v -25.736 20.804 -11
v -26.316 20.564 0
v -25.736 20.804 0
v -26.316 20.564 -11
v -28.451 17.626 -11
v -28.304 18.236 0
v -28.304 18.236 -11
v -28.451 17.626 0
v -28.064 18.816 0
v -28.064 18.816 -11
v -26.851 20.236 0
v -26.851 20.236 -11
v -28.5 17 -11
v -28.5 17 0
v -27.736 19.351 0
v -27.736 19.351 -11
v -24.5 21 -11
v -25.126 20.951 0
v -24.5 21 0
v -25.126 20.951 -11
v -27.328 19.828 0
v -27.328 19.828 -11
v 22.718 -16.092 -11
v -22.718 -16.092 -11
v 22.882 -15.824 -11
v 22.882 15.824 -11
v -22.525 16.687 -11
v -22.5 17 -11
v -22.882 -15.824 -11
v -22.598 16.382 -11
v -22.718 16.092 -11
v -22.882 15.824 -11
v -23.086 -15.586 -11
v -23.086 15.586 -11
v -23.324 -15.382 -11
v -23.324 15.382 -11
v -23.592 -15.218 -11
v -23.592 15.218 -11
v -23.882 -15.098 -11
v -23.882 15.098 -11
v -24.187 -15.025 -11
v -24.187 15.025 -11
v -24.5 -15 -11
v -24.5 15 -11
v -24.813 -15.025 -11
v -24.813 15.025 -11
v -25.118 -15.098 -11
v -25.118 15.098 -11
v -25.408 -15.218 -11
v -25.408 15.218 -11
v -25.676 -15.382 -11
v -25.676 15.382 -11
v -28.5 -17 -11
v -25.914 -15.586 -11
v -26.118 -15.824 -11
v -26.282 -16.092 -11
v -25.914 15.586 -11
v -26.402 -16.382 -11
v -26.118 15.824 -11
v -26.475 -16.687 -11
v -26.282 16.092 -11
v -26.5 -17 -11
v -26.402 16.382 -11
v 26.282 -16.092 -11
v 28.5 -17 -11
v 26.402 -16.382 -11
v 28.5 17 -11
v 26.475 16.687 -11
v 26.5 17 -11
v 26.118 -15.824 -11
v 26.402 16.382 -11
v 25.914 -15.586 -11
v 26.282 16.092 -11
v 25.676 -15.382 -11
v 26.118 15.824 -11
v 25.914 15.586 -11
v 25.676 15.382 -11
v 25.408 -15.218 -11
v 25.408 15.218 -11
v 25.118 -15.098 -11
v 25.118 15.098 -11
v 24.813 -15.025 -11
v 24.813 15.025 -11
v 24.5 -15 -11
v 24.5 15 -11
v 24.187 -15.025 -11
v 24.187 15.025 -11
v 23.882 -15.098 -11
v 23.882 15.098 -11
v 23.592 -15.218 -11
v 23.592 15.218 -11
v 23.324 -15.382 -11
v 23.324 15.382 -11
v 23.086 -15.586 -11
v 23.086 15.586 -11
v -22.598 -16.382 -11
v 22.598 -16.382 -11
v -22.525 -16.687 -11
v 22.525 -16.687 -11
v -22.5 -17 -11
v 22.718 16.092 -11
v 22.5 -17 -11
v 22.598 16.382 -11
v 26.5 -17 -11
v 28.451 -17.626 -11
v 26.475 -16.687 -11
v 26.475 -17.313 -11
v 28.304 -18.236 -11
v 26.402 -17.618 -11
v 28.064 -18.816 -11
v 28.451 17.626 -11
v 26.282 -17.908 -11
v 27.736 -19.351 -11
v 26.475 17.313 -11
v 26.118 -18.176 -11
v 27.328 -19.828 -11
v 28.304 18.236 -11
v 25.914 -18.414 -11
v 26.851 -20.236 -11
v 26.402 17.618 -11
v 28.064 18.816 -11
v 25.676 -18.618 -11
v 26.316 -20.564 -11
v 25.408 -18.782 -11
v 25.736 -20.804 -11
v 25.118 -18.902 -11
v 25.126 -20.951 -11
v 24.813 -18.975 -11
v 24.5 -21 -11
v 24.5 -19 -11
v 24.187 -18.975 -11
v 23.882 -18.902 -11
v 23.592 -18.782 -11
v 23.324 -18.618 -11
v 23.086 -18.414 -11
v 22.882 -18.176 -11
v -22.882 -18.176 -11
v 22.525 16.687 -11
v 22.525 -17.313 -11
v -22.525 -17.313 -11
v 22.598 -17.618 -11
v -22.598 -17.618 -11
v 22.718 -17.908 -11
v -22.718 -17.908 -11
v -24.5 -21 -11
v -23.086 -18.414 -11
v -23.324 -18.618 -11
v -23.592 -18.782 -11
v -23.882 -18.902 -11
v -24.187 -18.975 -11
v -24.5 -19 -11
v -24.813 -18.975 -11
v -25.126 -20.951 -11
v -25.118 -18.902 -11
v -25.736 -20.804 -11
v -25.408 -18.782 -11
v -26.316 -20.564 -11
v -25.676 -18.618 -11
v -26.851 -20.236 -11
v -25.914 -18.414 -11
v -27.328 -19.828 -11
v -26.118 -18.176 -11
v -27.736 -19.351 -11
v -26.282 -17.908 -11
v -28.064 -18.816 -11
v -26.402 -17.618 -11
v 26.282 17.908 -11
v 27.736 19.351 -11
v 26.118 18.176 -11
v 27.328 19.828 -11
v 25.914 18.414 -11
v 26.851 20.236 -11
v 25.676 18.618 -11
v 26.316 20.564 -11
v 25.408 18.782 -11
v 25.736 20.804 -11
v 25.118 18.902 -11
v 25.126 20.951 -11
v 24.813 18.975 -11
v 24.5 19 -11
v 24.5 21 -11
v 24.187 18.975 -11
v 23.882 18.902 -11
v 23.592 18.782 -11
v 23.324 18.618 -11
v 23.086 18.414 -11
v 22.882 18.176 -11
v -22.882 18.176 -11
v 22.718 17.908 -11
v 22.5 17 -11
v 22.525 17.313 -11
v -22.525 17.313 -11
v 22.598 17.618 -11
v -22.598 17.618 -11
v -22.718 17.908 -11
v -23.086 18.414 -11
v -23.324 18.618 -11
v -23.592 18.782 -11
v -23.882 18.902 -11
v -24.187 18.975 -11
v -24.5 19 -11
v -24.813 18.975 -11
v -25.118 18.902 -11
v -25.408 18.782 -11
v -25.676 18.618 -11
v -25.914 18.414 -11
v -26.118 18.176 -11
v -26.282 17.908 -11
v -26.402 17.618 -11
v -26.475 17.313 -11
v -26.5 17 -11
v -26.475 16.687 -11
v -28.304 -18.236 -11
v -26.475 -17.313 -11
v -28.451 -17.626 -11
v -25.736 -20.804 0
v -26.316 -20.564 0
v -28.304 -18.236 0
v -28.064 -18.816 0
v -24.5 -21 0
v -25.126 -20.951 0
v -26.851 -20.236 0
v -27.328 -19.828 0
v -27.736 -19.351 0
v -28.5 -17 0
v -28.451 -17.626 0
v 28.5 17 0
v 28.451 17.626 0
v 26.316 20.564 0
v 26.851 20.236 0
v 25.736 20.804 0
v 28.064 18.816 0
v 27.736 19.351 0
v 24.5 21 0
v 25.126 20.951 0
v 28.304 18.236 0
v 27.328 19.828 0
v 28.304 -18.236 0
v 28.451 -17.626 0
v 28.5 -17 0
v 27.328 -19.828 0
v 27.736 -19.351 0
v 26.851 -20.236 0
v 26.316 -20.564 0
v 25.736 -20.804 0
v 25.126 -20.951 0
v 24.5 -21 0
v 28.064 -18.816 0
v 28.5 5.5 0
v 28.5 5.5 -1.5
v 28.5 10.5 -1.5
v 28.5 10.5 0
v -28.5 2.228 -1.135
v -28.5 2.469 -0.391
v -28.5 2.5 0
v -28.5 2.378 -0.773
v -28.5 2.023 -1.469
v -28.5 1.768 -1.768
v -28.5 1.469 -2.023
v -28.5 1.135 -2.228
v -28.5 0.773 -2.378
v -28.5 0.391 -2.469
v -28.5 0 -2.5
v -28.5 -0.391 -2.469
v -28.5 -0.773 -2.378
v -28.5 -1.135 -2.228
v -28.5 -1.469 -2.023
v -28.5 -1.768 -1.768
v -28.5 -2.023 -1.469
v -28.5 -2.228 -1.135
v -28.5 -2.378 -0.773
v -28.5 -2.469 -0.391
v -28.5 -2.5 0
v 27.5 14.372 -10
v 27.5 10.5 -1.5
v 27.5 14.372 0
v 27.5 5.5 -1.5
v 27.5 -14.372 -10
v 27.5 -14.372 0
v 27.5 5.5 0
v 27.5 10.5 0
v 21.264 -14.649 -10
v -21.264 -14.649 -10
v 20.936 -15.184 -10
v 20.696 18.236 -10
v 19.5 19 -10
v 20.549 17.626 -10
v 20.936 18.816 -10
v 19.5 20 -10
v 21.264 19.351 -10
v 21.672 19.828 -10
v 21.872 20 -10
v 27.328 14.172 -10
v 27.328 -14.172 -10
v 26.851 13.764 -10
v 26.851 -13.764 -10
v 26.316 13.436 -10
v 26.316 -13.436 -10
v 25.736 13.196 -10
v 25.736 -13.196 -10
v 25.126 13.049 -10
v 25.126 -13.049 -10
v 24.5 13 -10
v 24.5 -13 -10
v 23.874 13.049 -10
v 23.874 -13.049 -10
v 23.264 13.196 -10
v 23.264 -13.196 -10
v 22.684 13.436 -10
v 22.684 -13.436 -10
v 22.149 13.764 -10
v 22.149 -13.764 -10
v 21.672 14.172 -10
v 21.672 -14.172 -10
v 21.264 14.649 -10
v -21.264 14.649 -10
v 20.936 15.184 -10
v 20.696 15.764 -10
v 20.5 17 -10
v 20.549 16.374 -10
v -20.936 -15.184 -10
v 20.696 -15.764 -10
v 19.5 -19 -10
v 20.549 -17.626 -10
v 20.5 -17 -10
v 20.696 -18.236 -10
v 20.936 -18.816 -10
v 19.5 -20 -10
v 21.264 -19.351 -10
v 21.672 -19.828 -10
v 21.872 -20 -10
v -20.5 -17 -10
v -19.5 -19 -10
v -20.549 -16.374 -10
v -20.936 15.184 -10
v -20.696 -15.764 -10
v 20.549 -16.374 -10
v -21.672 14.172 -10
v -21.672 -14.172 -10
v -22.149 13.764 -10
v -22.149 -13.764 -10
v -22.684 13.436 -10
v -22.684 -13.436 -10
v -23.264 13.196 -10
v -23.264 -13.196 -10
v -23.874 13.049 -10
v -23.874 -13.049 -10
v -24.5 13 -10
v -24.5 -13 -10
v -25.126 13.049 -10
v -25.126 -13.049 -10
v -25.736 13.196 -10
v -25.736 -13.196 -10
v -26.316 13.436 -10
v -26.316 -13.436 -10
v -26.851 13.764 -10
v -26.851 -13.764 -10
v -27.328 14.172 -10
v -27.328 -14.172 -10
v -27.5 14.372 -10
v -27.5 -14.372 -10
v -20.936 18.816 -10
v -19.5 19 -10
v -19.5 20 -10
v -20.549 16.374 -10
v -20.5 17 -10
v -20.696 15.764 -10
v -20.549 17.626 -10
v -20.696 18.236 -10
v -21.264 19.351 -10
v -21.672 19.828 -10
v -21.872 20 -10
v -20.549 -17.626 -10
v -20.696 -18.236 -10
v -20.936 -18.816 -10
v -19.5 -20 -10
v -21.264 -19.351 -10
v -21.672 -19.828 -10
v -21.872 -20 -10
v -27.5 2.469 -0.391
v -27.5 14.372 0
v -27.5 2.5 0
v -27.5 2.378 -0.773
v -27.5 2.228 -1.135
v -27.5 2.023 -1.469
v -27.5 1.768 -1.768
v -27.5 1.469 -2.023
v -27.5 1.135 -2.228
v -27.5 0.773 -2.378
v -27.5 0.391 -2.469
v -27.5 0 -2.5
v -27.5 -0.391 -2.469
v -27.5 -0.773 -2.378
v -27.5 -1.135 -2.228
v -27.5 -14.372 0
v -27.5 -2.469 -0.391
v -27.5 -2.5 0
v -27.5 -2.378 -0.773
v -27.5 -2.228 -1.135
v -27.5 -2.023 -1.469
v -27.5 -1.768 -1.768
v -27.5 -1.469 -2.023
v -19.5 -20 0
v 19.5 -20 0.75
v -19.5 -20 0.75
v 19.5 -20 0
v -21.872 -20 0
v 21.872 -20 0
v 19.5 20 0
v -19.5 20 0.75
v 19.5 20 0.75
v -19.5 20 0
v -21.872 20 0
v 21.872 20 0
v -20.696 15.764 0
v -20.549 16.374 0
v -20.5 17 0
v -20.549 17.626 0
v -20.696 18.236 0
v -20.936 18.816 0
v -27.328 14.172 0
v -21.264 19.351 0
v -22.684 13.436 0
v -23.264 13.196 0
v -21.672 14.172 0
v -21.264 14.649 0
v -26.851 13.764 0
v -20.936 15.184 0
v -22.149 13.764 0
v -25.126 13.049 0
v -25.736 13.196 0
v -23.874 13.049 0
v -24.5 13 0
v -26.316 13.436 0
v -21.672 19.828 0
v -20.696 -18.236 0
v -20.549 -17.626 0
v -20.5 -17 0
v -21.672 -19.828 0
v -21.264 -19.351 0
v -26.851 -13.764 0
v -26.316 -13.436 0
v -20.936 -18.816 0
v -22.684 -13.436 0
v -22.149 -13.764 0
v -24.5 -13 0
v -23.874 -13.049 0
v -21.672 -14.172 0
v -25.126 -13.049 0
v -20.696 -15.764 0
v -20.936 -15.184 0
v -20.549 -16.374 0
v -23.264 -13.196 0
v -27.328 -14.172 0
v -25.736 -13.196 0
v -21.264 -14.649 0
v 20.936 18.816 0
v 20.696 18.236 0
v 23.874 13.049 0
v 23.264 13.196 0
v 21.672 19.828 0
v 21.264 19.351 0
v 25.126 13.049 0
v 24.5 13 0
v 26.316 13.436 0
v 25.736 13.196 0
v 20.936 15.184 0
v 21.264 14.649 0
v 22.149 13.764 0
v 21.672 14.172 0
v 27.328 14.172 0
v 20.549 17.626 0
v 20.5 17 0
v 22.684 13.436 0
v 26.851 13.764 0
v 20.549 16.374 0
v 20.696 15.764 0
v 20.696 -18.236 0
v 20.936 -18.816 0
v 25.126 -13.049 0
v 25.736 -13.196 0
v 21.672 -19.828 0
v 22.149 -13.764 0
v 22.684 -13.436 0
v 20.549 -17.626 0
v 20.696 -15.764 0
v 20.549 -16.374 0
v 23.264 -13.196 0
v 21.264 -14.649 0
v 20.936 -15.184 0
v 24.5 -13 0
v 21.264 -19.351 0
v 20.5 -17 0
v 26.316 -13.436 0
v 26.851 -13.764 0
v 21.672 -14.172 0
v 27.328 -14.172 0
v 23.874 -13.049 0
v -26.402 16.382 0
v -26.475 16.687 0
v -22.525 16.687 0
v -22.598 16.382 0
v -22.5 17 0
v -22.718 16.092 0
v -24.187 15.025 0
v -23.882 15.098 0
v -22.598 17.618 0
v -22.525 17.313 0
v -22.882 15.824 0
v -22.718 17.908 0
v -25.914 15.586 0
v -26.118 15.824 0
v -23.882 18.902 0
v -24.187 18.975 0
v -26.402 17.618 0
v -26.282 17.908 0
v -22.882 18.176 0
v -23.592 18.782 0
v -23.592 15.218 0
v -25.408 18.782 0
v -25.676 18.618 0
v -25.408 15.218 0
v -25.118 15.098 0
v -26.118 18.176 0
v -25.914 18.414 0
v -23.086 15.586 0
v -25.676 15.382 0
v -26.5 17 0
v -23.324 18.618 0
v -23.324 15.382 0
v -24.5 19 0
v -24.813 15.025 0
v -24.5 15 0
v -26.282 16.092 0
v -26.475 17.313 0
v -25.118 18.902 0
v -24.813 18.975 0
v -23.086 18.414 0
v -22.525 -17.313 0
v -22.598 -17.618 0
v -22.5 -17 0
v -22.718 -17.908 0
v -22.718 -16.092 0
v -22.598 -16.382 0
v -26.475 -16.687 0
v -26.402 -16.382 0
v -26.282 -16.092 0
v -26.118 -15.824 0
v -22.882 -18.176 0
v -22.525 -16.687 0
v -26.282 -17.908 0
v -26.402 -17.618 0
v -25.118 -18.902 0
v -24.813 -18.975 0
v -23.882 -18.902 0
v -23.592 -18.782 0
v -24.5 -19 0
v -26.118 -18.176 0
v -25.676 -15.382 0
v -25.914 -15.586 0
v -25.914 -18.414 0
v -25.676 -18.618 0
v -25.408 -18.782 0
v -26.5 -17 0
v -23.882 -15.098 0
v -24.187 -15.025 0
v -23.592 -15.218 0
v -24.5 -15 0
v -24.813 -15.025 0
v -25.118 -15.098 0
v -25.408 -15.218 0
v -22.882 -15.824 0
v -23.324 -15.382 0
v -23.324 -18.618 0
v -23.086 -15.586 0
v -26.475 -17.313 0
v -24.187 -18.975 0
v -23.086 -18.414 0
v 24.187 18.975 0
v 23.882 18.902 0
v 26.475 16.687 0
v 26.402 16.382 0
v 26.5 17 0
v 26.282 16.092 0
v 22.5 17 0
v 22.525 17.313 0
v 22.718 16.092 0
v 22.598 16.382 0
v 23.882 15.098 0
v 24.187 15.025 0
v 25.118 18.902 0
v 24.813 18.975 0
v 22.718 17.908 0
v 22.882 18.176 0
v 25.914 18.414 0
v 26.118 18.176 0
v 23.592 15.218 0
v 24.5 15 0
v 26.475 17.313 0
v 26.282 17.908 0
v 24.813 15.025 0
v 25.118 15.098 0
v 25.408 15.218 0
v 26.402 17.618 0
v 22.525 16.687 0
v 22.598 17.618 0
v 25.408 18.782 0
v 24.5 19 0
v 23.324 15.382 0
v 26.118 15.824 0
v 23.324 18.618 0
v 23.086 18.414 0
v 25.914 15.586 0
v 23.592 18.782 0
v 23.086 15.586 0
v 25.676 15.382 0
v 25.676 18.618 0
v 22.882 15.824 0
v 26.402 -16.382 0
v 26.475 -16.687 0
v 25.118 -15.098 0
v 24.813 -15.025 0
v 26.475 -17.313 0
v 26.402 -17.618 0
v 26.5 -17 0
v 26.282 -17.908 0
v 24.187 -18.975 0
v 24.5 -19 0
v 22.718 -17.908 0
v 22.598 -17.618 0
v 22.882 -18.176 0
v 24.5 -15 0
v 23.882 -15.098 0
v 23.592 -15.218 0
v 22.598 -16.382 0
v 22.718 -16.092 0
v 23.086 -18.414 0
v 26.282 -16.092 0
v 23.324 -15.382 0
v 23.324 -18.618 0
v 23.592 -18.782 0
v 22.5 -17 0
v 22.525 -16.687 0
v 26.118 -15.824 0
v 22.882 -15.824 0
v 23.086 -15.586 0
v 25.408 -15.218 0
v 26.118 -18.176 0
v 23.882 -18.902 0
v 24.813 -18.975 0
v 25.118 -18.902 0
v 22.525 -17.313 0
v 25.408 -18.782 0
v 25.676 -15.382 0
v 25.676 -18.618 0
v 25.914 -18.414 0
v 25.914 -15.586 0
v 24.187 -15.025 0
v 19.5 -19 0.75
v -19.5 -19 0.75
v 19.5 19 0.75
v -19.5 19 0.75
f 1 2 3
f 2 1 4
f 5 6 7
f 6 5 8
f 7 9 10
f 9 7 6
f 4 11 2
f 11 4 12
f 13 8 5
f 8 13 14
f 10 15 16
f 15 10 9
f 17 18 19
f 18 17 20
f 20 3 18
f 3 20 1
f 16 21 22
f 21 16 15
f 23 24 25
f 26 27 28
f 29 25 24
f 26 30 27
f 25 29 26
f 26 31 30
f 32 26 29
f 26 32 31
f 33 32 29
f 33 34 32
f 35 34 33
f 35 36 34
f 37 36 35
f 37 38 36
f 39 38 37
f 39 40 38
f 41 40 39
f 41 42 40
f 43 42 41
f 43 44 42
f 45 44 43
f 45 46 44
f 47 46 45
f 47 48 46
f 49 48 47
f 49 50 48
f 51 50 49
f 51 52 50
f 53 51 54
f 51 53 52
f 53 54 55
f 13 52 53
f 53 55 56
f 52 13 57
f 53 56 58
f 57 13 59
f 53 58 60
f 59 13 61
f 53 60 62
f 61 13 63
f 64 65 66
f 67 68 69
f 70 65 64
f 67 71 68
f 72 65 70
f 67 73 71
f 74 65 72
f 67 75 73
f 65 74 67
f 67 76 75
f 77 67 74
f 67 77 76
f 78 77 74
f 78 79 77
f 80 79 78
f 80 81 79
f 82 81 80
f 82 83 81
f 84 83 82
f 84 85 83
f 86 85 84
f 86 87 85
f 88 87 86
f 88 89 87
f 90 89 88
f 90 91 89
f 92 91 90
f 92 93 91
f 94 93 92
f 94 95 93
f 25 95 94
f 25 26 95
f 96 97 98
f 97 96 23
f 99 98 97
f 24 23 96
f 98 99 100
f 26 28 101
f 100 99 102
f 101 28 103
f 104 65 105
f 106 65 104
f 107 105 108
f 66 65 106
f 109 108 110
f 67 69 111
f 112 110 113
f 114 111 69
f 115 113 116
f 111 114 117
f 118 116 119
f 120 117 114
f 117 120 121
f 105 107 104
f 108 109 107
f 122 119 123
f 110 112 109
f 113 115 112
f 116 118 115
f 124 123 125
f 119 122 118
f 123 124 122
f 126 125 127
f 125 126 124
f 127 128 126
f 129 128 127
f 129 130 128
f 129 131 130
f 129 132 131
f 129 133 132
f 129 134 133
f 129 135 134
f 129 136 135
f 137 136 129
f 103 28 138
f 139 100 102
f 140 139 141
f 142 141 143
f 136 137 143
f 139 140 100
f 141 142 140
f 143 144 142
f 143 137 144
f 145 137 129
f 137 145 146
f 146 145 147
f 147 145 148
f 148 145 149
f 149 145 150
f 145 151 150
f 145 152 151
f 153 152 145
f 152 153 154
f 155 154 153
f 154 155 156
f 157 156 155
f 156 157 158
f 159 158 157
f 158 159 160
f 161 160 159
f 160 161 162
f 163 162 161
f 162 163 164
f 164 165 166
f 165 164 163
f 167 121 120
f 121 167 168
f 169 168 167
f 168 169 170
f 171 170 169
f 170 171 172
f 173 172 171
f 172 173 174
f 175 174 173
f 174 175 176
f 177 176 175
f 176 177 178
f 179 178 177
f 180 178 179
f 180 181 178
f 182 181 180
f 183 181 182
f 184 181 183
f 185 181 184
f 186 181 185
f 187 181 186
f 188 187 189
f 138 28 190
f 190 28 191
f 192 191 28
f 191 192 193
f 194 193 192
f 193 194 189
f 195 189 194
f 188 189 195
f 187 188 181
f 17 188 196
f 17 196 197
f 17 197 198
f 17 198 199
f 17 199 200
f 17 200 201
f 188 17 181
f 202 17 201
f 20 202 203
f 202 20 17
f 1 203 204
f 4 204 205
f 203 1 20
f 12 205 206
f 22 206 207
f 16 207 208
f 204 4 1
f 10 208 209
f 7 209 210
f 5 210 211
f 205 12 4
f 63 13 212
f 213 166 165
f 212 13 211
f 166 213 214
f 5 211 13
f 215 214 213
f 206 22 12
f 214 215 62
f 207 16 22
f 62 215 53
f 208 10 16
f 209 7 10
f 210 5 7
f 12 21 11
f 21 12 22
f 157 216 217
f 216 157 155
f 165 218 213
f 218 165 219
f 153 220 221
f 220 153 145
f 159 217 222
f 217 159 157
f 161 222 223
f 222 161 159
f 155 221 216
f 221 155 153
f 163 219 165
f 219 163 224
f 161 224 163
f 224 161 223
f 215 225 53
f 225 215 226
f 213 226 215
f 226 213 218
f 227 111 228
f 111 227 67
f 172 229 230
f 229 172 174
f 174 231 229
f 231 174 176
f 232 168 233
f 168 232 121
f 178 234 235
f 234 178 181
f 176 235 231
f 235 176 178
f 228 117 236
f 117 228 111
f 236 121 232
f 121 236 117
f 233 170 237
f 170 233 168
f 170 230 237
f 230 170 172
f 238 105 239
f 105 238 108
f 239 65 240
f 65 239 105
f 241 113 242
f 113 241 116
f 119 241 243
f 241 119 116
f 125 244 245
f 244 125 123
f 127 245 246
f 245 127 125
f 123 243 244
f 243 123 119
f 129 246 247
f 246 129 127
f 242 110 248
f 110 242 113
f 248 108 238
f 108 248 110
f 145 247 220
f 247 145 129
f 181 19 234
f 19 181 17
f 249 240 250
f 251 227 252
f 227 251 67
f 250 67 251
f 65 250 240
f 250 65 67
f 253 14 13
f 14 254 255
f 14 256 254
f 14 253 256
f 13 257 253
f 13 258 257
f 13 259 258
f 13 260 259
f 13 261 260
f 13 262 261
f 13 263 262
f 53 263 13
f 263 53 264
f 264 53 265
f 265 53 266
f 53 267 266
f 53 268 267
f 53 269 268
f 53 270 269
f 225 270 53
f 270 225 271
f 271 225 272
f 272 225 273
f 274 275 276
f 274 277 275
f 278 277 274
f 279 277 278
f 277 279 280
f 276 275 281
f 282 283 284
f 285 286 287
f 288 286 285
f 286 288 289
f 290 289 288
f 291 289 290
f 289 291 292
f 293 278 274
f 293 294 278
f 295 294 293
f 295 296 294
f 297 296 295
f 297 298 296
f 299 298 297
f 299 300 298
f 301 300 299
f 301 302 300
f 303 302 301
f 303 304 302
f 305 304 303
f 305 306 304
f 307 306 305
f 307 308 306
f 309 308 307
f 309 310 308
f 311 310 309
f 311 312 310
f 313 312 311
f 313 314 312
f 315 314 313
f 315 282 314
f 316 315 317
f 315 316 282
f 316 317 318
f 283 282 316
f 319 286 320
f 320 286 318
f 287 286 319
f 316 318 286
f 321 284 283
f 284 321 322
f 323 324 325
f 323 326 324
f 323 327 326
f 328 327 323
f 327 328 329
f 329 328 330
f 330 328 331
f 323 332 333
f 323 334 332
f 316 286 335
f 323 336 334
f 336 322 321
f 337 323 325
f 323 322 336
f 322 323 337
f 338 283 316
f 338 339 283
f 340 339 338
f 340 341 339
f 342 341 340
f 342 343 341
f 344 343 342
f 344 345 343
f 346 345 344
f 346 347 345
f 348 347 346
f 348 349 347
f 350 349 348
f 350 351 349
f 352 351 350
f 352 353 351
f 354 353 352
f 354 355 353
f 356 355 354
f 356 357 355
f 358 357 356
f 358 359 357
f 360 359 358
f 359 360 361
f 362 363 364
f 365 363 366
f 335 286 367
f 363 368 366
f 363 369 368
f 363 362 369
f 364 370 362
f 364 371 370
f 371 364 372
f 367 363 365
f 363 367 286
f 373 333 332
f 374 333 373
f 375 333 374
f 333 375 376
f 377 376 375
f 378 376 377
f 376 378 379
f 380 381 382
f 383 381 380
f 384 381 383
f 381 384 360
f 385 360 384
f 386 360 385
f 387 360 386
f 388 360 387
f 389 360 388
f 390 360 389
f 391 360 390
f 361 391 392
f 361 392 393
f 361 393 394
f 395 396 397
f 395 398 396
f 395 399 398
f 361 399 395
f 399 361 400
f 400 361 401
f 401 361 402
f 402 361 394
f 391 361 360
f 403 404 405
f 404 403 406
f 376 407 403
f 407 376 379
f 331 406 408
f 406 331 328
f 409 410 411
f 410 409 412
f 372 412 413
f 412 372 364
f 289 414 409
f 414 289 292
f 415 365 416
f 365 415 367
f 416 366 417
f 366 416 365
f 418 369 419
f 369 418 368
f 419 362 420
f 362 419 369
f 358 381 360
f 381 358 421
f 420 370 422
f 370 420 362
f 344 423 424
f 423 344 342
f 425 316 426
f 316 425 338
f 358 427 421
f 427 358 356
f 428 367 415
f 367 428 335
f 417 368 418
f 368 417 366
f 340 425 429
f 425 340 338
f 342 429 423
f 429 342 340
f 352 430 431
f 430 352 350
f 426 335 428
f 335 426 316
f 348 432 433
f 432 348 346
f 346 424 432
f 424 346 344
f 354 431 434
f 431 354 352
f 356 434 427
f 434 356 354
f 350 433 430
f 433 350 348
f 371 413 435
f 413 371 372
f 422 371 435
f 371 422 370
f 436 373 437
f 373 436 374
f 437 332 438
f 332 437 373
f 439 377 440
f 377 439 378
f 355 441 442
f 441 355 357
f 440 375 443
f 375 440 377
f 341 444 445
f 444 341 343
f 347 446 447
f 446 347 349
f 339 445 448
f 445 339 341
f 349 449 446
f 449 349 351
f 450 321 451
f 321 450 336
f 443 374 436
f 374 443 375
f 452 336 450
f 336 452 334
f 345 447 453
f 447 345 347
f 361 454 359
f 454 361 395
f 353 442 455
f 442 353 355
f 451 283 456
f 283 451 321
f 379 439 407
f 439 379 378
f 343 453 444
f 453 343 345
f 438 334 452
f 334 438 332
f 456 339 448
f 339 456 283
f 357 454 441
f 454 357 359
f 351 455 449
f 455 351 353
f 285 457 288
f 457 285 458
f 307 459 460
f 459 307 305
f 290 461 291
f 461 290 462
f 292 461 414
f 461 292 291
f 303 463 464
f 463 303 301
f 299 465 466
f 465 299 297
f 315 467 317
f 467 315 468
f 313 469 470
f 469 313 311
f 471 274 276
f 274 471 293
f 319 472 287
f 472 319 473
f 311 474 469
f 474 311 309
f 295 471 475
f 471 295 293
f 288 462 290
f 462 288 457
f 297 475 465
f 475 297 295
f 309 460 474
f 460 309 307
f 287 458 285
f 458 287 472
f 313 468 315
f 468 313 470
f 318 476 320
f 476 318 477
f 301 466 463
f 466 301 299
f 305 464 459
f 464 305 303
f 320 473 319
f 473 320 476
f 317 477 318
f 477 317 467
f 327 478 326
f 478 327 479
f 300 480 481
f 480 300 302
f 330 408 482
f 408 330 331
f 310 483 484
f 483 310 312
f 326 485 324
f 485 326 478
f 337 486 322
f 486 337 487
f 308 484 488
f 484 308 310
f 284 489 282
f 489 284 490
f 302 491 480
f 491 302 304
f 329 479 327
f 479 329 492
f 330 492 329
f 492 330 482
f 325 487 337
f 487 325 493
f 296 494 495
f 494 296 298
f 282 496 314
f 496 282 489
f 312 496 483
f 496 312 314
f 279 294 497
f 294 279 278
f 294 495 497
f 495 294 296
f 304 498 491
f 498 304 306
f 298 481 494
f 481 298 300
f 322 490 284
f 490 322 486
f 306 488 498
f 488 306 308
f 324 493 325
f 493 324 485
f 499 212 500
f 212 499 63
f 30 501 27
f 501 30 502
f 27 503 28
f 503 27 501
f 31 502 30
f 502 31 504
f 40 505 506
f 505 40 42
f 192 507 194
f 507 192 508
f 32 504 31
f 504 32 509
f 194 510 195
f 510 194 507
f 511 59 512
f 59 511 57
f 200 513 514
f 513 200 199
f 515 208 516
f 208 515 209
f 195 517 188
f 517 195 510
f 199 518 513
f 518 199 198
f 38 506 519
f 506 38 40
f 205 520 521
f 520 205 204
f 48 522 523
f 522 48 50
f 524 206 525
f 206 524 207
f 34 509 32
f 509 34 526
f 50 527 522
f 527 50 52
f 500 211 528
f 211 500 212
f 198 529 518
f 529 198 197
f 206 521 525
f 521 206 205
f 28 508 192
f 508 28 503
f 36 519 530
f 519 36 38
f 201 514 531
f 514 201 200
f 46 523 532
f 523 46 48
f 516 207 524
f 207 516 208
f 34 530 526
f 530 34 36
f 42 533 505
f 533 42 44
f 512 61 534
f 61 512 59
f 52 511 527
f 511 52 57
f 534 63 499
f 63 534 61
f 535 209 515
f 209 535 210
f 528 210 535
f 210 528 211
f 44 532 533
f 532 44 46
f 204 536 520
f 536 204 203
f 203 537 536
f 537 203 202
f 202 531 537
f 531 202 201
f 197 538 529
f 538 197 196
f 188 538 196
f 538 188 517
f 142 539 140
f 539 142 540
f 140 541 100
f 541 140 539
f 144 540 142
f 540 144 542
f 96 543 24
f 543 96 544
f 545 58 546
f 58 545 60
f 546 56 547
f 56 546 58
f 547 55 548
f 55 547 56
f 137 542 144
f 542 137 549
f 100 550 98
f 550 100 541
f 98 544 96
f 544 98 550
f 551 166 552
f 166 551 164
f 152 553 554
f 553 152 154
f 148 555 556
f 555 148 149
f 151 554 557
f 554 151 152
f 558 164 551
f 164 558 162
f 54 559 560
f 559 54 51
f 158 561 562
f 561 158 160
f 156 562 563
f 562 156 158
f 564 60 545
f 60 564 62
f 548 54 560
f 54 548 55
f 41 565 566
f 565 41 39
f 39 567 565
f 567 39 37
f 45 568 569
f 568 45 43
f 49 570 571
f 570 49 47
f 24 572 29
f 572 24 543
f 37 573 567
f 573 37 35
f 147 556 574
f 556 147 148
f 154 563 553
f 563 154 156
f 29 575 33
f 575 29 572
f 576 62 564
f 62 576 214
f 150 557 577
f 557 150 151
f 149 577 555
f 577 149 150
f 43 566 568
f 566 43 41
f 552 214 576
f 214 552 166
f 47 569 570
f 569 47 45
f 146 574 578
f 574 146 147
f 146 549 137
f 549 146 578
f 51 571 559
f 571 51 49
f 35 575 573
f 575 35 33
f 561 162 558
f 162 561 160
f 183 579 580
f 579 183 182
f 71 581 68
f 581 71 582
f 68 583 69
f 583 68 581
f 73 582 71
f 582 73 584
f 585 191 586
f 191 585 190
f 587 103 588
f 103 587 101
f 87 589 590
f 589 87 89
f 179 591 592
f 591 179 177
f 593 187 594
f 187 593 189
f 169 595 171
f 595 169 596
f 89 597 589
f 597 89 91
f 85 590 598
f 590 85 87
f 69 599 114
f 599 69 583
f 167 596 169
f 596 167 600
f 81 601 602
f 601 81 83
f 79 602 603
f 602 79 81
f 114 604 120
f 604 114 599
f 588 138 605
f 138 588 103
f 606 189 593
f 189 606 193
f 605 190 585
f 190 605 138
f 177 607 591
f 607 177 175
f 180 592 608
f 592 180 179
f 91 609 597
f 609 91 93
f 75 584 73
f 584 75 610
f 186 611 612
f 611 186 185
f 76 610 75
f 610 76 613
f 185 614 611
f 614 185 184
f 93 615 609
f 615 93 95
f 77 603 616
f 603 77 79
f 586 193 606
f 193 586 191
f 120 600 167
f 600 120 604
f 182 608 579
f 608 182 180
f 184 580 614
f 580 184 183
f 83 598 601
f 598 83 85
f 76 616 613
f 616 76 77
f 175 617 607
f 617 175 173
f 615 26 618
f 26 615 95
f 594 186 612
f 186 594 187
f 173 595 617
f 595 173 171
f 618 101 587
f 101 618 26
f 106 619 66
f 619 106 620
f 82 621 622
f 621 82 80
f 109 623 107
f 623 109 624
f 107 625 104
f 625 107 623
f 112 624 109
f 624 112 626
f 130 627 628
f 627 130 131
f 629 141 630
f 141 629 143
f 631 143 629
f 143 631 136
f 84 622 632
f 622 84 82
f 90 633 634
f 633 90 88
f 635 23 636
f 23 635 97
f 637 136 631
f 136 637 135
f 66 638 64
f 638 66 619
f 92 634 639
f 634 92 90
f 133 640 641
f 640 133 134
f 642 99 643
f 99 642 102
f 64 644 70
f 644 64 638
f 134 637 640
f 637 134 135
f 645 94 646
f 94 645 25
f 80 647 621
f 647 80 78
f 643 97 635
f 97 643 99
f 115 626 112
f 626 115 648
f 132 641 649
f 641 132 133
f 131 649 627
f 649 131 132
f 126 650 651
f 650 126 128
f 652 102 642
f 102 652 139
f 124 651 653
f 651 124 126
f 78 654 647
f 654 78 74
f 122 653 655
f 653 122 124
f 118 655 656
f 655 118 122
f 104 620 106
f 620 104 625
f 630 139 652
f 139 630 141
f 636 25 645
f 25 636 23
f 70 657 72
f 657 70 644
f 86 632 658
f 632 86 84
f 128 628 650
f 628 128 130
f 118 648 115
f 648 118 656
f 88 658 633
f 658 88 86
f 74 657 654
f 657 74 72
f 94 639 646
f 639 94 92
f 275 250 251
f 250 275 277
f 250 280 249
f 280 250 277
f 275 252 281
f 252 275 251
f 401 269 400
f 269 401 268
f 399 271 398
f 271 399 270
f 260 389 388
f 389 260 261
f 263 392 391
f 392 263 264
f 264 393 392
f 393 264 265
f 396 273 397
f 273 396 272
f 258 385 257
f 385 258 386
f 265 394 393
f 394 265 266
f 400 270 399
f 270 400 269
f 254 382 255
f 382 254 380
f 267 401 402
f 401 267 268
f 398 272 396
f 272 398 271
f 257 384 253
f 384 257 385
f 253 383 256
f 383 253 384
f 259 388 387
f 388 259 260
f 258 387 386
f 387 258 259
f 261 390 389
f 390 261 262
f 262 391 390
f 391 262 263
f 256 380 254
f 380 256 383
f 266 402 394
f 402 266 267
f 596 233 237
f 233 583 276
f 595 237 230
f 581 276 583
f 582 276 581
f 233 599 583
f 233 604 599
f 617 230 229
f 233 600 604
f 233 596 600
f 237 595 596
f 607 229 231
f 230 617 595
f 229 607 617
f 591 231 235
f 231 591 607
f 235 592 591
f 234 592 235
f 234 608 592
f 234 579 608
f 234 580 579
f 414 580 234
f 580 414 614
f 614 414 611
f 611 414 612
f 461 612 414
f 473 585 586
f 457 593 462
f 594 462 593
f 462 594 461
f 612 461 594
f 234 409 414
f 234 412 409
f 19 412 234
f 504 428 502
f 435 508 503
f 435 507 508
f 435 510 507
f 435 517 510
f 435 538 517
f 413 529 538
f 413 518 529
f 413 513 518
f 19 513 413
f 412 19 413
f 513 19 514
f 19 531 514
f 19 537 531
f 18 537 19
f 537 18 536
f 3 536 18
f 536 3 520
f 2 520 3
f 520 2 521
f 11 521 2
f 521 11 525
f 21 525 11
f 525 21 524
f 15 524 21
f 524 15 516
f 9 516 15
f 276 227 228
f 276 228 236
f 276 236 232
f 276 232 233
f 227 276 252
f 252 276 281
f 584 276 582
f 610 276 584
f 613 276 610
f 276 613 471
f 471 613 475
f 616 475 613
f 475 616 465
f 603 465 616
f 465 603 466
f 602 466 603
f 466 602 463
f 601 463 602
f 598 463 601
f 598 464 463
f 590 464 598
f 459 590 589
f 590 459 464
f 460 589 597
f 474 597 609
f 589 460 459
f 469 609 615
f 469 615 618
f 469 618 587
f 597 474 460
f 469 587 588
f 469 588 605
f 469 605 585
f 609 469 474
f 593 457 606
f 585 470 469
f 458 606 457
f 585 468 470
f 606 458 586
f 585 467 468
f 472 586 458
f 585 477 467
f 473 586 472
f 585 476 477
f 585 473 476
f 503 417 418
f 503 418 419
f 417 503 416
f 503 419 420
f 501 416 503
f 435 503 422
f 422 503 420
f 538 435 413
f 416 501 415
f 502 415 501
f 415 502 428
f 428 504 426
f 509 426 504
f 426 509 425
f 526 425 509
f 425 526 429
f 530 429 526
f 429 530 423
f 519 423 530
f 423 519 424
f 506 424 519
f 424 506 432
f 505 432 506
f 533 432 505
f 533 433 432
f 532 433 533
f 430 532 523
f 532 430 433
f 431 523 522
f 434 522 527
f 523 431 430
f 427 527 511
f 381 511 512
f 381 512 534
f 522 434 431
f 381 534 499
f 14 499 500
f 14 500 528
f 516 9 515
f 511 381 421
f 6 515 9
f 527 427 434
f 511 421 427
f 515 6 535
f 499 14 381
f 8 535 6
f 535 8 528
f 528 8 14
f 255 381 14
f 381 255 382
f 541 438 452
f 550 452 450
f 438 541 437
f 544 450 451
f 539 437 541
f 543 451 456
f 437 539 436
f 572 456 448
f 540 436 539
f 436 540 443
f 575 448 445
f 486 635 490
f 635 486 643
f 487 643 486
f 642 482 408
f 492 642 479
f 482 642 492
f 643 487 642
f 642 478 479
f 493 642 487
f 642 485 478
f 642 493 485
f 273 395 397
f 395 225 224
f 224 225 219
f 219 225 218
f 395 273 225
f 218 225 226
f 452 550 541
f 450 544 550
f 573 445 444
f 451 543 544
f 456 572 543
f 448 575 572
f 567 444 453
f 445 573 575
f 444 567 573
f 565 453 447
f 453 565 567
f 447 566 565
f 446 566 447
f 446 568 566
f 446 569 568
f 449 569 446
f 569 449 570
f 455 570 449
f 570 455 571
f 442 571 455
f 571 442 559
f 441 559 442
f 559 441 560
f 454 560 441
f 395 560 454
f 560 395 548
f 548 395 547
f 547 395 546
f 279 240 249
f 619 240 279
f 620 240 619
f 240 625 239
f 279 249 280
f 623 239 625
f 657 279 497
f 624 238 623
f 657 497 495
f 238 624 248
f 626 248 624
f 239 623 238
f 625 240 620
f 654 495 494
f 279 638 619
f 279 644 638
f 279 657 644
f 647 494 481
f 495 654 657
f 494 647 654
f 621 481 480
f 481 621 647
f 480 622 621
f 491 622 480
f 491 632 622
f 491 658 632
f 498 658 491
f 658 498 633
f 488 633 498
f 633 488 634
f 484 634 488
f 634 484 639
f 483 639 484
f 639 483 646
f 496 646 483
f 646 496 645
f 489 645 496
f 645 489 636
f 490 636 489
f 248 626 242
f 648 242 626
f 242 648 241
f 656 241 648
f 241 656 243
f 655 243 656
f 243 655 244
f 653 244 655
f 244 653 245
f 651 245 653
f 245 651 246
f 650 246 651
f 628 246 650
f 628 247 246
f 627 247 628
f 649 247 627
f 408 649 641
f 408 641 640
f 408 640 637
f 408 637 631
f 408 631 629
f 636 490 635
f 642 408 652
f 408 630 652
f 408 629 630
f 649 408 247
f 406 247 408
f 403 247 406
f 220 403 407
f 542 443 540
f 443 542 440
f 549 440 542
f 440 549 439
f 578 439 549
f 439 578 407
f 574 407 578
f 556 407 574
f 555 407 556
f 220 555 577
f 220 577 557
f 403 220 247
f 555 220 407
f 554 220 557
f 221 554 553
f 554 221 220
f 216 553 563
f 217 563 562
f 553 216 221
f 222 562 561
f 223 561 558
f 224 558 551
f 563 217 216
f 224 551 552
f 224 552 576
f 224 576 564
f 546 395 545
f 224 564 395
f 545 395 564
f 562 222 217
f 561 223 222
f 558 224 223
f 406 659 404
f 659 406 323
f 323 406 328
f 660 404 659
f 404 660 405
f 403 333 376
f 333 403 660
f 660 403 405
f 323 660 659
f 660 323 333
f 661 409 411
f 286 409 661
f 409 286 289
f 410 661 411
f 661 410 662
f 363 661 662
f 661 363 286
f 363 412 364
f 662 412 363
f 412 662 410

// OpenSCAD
$fn = 40;
INNER_W=55;
INNER_D=40;
INNER_H=20;
THICK=1;
SCREW_R=2.5/2;

box_top();
//box_bottom();
//exploded_view();
//plated_view();

module plated_view() {
    translate([0,INNER_D+10,0]) box_top();
    box_bottom();
}

module exploded_view() {
    translate([0,0,20]) rotate([180,0,0]) box_top();
    box_bottom();
}

module box_top() {
    rotate([180,0,0]) union() {
        intersection() {
            translate([0,0,500]) cube([1000,1000,1000], center=true);
            box(screw_r = 2);
        }
        // Tabs to hold top to bottom
        for(a=[0,180])
            rotate([0,0,a])
                translate([0,INNER_D/2-0.5,5])
                    cube([INNER_W-16,1,INNER_H/2+1.5], center=true);
    }
}

module box_bottom() {
   intersection() {
        translate([0,0,-500]) cube([1000,1000,1000], center=true); 
        box(screw_r = 1.5);
    }
}
    
module box() {
    difference() {
        union() {
            difference() {
                rounded_cube(
                    size=[INNER_W+THICK*2, INNER_D+THICK*2, INNER_H+THICK*2],
                    r=4
                );
                cube(size=[INNER_W, INNER_D, INNER_H], center=true);
            }
            for(x=[-1,1]) for(y=[-1,1])
                translate([x*(INNER_W/2-4+THICK),y*(INNER_D/2-4+THICK),0])
                    cylinder(r=4,h=INNER_H+THICK,center=true);
        }

        // Screw holes
        for(x=[-1,1]) for(y=[-1,1])
            translate([x*(INNER_W/2-4+THICK),y*(INNER_D/2-4+THICK),THICK]) {
                // Screw
                cylinder(r=screw_r,h=INNER_H+THICK+0.01,center=true);
            }
            
        // Cut holes for components
        translate([INNER_W/2,3,-5])
            cube(size=[10,8,4], center=true);

        translate([INNER_W/2,-8,0])
            cube(size=[10,5,3], center=true);

        translate([-INNER_W/2,0,0])
            rotate([0,90,0])
                cylinder(r=2.5, h=10, center=true);


/*(
        translate([INNER_W/2,30,0])
            cube(size=[10,5,2], center=true);
            
        for(y=[10,30])
            translate([-INNER_W/2,y,-7.5])

*/
    }
    
    
}

module lid() {
    union() {
        rounded_cube(size=[INNER_W+THICK*2, INNER_D+THICK*2, THICK], r=5);
        translate([0,0,THICK])
        rounded_cube(size=[INNER_W - 0.5, INNER_D - 0.5, THICK], r=5);
    }
}

module rounded_cube(size, r, inset = [0,0,0]) {
    union() {
        cube(size=[size[0]-r*2, size[1]-inset[1], size[2]-inset[2]], center=true);
        cube(size=[size[0]-inset[0], size[1]-r*2, size[2]-inset[2]], center=true);
        for(x=[-1,1]) for(y=[-1,1])
            translate([x*(size[0]/2-r),y*(size[1]/2-r),0])
                cylinder(r=r,h=size[2],center=true);
    }
}
